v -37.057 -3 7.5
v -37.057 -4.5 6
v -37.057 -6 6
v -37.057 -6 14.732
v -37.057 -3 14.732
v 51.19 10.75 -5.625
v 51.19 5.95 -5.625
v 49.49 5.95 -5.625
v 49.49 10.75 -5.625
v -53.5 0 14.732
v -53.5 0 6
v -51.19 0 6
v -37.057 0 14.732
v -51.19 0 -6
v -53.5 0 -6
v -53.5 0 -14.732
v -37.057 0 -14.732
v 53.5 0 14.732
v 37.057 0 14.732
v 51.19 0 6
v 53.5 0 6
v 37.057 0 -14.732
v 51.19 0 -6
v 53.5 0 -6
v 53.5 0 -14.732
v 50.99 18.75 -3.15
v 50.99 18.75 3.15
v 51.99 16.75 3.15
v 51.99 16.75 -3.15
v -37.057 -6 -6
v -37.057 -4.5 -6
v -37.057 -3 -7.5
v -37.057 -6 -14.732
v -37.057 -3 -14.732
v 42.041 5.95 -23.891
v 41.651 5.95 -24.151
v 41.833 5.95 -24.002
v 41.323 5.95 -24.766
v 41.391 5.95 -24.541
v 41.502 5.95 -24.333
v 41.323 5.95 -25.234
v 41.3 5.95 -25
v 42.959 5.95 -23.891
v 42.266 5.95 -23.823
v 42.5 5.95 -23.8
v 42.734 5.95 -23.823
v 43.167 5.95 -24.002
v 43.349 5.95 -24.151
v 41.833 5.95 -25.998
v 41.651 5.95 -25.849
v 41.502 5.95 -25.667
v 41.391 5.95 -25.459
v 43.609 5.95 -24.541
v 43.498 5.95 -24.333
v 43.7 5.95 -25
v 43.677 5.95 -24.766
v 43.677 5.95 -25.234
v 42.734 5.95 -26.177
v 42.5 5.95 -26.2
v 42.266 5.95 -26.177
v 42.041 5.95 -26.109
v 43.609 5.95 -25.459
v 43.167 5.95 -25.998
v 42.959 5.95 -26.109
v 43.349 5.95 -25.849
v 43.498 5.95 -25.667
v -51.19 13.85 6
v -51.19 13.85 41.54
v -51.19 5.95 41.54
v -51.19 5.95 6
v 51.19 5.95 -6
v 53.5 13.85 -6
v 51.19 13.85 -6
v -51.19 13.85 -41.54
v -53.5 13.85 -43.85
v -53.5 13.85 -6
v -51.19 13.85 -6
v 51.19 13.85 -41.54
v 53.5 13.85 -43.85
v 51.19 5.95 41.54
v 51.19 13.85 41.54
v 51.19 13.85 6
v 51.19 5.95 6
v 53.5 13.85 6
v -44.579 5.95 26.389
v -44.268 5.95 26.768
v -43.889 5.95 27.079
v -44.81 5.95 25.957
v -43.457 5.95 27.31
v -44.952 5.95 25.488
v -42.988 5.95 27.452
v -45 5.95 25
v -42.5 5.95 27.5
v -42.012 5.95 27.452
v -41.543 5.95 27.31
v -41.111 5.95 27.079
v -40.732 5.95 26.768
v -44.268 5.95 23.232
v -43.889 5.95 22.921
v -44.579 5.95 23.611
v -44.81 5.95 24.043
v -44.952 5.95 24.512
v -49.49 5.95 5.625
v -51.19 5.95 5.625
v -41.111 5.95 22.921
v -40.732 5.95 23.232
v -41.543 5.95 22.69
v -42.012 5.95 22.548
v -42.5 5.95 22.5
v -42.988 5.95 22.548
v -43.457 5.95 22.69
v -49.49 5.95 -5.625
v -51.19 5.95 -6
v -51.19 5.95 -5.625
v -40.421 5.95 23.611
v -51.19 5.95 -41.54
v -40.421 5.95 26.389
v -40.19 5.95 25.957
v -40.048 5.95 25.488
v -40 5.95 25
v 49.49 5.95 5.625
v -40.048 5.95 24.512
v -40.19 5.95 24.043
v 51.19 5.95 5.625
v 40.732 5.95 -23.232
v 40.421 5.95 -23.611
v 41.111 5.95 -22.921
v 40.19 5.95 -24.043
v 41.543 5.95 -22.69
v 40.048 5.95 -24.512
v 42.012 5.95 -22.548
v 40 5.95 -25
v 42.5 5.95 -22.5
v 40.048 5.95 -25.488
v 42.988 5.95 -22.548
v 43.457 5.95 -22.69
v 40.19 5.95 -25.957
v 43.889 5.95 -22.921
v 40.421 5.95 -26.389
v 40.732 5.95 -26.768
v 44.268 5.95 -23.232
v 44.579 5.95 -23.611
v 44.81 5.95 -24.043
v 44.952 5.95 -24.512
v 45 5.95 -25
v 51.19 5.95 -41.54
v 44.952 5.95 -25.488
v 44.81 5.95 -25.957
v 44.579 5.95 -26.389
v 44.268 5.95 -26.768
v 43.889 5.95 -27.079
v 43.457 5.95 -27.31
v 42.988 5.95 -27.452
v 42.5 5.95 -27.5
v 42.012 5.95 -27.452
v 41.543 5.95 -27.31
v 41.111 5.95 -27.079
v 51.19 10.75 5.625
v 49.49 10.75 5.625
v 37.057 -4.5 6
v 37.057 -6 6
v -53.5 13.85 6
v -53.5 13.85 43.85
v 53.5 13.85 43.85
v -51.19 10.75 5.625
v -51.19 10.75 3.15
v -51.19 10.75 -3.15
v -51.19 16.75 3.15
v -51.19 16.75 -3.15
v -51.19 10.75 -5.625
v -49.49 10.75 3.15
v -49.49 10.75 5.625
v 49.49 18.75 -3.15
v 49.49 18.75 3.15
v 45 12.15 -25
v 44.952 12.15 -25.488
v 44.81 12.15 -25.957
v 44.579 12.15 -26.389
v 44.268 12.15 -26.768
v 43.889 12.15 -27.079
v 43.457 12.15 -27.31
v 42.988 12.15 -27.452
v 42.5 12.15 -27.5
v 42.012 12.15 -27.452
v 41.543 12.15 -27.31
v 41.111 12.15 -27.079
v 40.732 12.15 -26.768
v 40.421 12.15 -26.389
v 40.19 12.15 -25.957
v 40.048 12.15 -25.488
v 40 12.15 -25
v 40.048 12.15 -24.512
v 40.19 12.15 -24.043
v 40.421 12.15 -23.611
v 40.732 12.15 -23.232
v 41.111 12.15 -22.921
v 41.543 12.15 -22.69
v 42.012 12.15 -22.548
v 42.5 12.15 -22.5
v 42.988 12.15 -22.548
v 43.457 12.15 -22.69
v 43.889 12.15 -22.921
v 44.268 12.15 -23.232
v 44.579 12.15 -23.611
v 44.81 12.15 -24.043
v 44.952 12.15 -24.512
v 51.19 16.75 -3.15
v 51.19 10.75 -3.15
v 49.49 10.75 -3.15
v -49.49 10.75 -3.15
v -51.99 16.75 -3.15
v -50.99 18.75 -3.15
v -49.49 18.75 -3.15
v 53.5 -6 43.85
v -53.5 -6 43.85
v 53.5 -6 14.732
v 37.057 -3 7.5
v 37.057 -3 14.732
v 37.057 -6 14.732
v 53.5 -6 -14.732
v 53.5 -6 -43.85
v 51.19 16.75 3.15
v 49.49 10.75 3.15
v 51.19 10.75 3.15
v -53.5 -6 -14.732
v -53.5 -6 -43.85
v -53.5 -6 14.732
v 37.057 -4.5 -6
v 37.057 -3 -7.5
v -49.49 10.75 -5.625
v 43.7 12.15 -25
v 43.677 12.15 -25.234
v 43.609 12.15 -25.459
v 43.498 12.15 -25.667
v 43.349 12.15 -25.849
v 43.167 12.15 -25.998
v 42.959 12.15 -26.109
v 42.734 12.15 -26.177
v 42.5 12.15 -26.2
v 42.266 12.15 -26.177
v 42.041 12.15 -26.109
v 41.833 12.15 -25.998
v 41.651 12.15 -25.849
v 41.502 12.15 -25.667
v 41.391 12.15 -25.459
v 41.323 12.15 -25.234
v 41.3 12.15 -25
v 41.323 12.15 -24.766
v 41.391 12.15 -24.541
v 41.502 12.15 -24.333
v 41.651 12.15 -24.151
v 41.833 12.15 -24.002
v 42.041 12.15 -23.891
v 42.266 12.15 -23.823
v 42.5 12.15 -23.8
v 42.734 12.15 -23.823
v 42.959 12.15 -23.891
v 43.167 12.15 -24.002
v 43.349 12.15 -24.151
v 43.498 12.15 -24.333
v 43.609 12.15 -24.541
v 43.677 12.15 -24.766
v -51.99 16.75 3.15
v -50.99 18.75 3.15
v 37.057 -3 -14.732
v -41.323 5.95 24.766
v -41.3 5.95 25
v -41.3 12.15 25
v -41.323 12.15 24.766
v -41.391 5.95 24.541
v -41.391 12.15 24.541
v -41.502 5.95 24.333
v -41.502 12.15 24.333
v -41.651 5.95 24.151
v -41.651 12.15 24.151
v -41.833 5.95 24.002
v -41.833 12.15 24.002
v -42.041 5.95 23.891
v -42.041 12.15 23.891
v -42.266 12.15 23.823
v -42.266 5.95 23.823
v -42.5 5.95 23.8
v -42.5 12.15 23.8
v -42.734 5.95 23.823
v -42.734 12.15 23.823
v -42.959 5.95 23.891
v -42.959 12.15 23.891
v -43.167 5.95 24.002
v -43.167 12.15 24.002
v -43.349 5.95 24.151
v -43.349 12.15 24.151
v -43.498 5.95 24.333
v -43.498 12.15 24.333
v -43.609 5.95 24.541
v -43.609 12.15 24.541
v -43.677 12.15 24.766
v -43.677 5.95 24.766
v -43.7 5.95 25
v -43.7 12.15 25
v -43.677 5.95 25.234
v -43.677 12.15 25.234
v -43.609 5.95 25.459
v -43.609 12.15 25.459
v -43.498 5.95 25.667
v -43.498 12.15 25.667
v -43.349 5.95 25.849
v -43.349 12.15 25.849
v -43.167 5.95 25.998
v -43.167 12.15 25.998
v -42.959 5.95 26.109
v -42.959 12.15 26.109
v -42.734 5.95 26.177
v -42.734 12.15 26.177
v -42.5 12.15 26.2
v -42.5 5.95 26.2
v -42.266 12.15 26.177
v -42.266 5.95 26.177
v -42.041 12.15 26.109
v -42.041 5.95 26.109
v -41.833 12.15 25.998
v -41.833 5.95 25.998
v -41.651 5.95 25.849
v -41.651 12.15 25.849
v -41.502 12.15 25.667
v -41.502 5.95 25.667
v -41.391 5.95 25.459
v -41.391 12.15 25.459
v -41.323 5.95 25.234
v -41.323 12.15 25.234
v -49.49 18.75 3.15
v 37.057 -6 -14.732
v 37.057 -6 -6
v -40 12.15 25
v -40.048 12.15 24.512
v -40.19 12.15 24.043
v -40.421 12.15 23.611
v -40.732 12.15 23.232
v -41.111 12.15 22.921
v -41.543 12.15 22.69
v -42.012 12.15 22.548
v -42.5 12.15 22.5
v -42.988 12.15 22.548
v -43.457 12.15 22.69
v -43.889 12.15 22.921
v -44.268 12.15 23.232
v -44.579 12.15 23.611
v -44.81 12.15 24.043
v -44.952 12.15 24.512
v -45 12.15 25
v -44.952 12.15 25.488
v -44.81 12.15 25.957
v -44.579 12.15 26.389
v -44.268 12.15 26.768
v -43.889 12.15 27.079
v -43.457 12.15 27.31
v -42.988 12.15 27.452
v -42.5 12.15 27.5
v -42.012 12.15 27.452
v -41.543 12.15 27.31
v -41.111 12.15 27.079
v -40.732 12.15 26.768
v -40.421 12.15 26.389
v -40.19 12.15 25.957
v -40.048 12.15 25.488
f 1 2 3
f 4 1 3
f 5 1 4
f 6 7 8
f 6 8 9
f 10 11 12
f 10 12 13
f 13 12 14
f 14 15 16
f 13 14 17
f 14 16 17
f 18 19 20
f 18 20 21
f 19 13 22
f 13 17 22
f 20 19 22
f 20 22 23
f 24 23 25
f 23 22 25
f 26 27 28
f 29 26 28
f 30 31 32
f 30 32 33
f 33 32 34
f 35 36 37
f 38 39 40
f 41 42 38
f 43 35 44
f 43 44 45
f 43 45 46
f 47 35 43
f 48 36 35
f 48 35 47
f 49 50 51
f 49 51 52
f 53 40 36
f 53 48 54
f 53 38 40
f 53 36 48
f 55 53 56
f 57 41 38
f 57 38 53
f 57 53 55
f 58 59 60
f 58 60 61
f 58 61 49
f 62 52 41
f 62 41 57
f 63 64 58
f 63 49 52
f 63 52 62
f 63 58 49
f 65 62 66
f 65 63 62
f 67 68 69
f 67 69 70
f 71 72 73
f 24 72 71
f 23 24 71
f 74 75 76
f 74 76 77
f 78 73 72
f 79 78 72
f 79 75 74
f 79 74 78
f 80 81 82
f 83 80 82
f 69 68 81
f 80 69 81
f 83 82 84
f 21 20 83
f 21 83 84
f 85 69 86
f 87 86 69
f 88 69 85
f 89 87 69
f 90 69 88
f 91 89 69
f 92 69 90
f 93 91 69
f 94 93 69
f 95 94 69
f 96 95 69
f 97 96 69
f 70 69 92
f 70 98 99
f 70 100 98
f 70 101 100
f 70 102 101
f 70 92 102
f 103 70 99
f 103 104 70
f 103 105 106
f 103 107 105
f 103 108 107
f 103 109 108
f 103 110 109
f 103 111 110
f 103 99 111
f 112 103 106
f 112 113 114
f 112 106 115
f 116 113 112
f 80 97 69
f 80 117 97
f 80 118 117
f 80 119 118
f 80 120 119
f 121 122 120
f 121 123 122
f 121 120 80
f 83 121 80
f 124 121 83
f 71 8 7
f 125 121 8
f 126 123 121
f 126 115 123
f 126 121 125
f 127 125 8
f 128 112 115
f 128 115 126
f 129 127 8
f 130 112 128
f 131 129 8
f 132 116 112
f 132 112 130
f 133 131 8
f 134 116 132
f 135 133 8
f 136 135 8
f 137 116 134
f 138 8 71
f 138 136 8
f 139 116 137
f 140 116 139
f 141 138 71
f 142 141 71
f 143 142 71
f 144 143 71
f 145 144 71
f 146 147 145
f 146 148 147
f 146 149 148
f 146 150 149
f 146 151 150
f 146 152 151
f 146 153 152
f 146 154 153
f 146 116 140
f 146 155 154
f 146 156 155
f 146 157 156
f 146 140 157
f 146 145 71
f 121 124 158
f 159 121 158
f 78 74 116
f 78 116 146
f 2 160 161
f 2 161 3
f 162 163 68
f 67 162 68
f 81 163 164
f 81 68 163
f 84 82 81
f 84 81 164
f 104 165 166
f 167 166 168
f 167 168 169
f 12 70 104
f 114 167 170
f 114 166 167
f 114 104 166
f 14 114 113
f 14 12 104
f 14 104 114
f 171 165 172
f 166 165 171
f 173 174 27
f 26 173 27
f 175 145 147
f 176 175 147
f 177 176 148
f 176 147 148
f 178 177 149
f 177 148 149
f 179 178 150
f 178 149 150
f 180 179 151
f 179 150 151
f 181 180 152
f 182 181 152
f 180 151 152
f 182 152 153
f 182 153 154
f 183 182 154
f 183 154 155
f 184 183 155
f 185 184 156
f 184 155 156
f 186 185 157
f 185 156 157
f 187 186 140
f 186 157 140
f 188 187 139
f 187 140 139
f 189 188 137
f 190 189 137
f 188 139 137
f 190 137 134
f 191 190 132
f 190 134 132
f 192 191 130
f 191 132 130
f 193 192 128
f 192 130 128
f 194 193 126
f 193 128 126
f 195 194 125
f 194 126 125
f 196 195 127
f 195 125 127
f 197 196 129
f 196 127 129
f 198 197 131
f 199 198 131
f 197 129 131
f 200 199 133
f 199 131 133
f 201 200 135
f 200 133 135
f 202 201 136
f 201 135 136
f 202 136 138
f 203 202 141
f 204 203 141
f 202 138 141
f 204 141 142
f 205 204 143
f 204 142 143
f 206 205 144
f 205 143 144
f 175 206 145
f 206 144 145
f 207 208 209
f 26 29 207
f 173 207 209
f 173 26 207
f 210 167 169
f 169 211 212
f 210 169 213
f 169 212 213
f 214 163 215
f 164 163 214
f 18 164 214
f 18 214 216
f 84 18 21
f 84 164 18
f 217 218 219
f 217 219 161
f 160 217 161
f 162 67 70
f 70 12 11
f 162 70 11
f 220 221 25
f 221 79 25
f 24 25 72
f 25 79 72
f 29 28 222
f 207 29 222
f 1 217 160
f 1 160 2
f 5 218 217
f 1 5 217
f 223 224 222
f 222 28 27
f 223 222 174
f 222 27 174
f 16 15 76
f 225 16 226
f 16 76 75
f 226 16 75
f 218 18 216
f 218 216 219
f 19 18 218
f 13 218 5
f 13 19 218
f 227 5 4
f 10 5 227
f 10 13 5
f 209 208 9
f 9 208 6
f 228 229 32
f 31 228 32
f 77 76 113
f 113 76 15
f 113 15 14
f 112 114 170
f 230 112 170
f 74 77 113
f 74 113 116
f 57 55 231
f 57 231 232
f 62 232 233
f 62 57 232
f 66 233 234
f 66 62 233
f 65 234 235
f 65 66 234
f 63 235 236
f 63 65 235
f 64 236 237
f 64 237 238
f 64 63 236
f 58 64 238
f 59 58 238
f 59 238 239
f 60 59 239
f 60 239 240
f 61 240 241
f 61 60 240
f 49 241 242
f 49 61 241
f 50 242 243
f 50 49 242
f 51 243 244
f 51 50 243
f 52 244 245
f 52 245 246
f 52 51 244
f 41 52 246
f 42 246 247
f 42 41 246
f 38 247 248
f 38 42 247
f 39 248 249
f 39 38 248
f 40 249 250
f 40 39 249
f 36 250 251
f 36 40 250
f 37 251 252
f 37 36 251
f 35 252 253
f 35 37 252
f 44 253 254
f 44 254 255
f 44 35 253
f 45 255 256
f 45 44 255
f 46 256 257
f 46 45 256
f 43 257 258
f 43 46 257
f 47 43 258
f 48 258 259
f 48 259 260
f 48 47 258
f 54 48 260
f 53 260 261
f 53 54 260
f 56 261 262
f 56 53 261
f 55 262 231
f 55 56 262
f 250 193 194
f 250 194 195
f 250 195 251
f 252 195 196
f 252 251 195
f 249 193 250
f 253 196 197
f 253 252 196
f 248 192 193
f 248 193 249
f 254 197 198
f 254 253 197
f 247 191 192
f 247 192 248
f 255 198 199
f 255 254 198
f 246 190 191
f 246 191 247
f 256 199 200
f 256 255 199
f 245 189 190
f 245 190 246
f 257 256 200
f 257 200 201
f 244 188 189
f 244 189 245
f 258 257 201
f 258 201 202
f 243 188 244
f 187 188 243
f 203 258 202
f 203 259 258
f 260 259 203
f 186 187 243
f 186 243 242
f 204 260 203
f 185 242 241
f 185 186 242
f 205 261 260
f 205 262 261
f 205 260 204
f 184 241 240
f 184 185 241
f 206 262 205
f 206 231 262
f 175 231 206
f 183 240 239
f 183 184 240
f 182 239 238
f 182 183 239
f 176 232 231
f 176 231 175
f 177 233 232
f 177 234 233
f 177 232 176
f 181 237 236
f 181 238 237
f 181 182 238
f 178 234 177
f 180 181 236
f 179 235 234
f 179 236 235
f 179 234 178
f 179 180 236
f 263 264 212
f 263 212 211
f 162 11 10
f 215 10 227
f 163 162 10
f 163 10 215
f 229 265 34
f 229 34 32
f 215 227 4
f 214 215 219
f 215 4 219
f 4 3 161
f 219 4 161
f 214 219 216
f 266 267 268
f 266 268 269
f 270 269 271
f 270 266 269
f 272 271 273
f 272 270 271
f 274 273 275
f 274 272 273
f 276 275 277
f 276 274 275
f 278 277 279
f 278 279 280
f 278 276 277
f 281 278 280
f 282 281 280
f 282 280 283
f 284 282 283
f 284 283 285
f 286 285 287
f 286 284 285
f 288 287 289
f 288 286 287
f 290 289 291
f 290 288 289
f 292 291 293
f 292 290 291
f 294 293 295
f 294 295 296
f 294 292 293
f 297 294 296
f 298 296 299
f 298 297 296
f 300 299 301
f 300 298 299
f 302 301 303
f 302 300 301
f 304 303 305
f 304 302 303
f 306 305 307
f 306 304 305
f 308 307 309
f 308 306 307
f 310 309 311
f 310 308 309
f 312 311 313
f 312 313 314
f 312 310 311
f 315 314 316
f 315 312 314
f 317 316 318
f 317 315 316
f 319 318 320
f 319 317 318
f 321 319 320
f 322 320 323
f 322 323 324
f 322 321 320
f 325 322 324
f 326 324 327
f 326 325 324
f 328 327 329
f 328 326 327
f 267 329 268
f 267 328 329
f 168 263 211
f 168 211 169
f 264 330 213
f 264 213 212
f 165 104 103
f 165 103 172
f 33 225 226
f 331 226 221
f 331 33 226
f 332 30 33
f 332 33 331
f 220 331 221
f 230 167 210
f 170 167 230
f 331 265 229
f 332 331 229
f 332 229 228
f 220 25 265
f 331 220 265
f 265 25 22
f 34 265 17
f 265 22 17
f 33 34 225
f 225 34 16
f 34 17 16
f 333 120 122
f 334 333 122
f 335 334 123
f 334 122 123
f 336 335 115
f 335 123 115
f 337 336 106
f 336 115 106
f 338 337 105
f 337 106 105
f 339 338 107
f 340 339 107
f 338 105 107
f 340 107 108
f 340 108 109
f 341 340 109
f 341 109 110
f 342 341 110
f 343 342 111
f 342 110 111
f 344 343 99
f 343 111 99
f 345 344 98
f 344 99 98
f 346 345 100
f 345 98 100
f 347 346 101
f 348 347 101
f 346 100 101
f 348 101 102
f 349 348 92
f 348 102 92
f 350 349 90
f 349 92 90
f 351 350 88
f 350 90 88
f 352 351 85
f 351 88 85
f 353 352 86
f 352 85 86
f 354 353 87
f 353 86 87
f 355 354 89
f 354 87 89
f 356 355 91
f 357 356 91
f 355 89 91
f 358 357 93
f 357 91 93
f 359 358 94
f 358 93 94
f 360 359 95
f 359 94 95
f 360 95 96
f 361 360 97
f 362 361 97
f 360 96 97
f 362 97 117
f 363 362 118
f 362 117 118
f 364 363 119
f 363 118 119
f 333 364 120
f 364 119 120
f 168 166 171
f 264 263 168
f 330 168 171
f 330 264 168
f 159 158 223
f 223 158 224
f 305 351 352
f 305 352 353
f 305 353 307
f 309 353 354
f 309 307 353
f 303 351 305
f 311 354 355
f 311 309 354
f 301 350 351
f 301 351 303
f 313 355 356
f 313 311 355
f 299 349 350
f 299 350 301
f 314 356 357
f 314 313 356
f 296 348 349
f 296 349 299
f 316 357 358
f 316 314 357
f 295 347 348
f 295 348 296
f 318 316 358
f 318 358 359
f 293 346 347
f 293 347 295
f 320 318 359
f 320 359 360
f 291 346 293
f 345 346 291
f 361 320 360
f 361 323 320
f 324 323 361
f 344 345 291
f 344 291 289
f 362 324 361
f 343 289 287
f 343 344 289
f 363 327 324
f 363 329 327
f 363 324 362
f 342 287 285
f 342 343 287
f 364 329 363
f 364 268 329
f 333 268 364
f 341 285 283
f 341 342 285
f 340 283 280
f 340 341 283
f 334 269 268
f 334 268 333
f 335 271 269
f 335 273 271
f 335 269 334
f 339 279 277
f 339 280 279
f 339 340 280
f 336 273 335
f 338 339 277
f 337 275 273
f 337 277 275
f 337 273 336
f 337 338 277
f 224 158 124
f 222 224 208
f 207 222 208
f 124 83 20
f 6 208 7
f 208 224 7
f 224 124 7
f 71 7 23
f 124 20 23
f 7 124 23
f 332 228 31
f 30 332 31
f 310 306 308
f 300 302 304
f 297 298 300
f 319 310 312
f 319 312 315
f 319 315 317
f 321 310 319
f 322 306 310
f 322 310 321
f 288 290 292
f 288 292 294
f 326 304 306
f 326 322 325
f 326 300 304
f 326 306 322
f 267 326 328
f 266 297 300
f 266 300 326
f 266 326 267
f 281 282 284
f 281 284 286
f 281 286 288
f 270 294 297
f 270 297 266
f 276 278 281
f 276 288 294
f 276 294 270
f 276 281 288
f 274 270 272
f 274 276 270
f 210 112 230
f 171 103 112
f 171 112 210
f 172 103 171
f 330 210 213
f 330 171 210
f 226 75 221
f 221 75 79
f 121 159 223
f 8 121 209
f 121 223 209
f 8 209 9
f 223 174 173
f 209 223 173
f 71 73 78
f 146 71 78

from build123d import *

# Parameters (mm, degrees)
SKETCH1_W           = 107
SKETCH1_H           = 87.7
BOSS_EXTRUDE1_DEPTH = 13.85
SKETCH2_W           = 102.38
SKETCH2_H           = 83.08
CUT_EXTRUDE1_DEPTH  = 7.9
SKETCH4_R           = 2.5
SKETCH4_R_2         = 1.2
BOSS_EXTRUDE2_DEPTH = 6.2
SKETCH7_W           = 11.25
SKETCH7_H           = 4.8
BOSS_EXTRUDE3_DEPTH = 1.7
BOSS_EXTRUDE4_DEPTH = 3.15
CUT_EXTRUDE8_START  = -12
CUT_EXTRUDE8_DEPTH  = 20
BOSS_EXTRUDE7_DEPTH = 6
SKETCH24_W          = 8.731680323
SKETCH24_H          = 3
CUT_EXTRUDE10_DEPTH = 91.556729163
CHAMFER1_SIZE       = 1.5
CHAMFER2_SIZE       = 1.5


with BuildPart() as part:
    # Sketch1 → Boss-Extrude1 (new body)
    with BuildSketch(Plane(origin=(0, 0, 0), x_dir=(1, 0, 0), z_dir=(0, 1, 0))):
        Rectangle(SKETCH1_W, SKETCH1_H)
    extrude(amount=BOSS_EXTRUDE1_DEPTH)

    # Sketch2 → Cut-Extrude1 (cut)
    with BuildSketch(Plane(origin=(0, 13.85, 0), x_dir=(1, 0, 0), z_dir=(0, 1, 0))):
        Rectangle(SKETCH2_W, SKETCH2_H)
    extrude(amount=-CUT_EXTRUDE1_DEPTH, mode=Mode.SUBTRACT)

    # Sketch4 → Boss-Extrude2 (add)
    with BuildSketch(Plane(origin=(0, 5.95, 0), x_dir=(1, 0, 0), z_dir=(0, 1, 0))):
        with Locations((-42.5, -25)):
            Circle(SKETCH4_R)
        with Locations((-42.5, -25)):
            Circle(SKETCH4_R_2, mode=Mode.SUBTRACT)
        with Locations((42.5, 25)):
            Circle(SKETCH4_R)
        with Locations((42.5, 25)):
            Circle(SKETCH4_R_2, mode=Mode.SUBTRACT)
    extrude(amount=BOSS_EXTRUDE2_DEPTH)

    # Sketch7 → Boss-Extrude3 (add)
    with BuildSketch(Plane(origin=(-51.19, 0, 0), x_dir=(0, 0, -1), z_dir=(1, 0, 0))):
        with Locations((0, 8.35)):
            Rectangle(SKETCH7_W, SKETCH7_H)
    boss_extrude3 = extrude(amount=BOSS_EXTRUDE3_DEPTH)

    # Sketch8 → Boss-Extrude4 (add, symmetric)
    with BuildSketch(Plane.XY):
        Polygon((-49.49, 10.75), (-49.49, 18.75), (-50.99, 18.75), (-51.99, 16.75), (-51.19, 16.75), (-51.19, 10.75), align=None)
    boss_extrude4 = extrude(amount=BOSS_EXTRUDE4_DEPTH, both=True)

    # Mirror1: Boss-Extrude4 across plane
    add(boss_extrude4.mirror(Plane(origin=(0, 0, 0), x_dir=(0, 0, 1), z_dir=(1, 0, 0))))

    # Mirror2: Boss-Extrude3 across plane
    add(boss_extrude3.mirror(Plane(origin=(0, 0, 0), x_dir=(0, 0, 1), z_dir=(1, 0, 0))))

    # Sketch22 → Cut-Extrude8 (cut)
    with BuildSketch(Plane(origin=(0, 5.95, 0), x_dir=(1, 0, 0), z_dir=(0, 1, 0)).offset(CUT_EXTRUDE8_START)):
        Polygon((-51.19, 0), (-51.19, -6), (-53.5, -6), (-53.5, 6), (-51.19, 6), align=None)
    cut_extrude8 = extrude(amount=CUT_EXTRUDE8_DEPTH, mode=Mode.SUBTRACT)

    # Mirror3: Cut-Extrude8 across plane
    add(cut_extrude8.mirror(Plane(origin=(0, 0, 0), x_dir=(0, 0, 1), z_dir=(1, 0, 0))), mode=Mode.SUBTRACT)

    # Sketch23 → Boss-Extrude7 (add)
    with BuildSketch(Plane(origin=(0, 0, 0), x_dir=(-1, 0, 0), z_dir=(0, -1, 0))):
        Polygon((53.5, -43.85), (-53.5, -43.85), (-53.5, -14.731680323), (-37.056729163, -14.731680323), (-37.056729163, -6), (37.056729163, -6), (37.056729163, -14.731680323), (53.5, -14.731680323), align=None)
    boss_extrude7 = extrude(amount=BOSS_EXTRUDE7_DEPTH)

    # Sketch24 → Cut-Extrude10 (cut, through all)
    with BuildSketch(Plane(origin=(37.056729163, 0, 0), x_dir=(0, 0, -1), z_dir=(1, 0, 0))):
        with Locations((-10.365840161, -1.5)):
            Rectangle(SKETCH24_W, SKETCH24_H)
    cut_extrude10 = extrude(amount=-CUT_EXTRUDE10_DEPTH, mode=Mode.SUBTRACT)

    # Chamfer1
    chamfer1_edges = [part.edges().sort_by_distance(p)[0] for p in [
        (0, -3, 6),
    ]]
    chamfer(chamfer1_edges, length=CHAMFER1_SIZE)

    # Mirror4: Boss-Extrude7 across plane
    add(boss_extrude7.mirror(Plane.XY))

    # Mirror7: Cut-Extrude10 across plane
    add(cut_extrude10.mirror(Plane.XY), mode=Mode.SUBTRACT)

    # Chamfer2
    chamfer2_edges = [part.edges().sort_by_distance(p)[0] for p in [
        (0, -3, -6),
    ]]
    chamfer(chamfer2_edges, length=CHAMFER2_SIZE)


solid = part.part
